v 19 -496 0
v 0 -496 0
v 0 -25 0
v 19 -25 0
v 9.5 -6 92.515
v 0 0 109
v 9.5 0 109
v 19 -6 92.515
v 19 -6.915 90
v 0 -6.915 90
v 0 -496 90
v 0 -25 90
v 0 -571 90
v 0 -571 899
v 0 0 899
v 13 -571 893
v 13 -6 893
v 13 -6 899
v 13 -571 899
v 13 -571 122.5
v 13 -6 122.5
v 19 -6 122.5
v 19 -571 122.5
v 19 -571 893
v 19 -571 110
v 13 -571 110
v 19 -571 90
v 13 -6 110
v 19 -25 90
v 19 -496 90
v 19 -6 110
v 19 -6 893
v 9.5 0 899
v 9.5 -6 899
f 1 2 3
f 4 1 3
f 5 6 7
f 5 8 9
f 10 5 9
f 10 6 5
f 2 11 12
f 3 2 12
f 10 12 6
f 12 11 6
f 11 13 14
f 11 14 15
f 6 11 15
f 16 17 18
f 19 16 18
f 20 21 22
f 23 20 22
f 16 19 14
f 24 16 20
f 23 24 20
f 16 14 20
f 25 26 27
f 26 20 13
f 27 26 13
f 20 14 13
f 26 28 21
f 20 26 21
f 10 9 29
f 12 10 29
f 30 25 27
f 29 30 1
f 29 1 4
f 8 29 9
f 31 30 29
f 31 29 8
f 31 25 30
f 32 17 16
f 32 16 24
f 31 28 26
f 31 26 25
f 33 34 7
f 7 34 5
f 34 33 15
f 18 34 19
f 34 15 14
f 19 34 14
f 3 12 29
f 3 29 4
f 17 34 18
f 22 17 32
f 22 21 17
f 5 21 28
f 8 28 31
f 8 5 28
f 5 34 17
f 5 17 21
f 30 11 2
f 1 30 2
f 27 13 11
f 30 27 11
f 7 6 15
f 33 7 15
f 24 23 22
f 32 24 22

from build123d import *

# Parameters (mm, degrees)
F1_DEPTH = 19
F2_W     = 6
F2_H     = 12.5
F3_DEPTH = 571.001
F4_W     = 9.5
F4_H     = 6
F5_DEPTH = 899.001
F7_DEPTH = 19.001
F8_W     = 6
F8_H     = 6
F9_DEPTH = 571.001


with BuildPart() as f1:
    # F0 (on Right) → F1 (new body)
    with BuildSketch(Plane.YZ):
        Polygon((-496, 0), (0, 0), (0, 899), (-571, 899), (-571, 90), (-496, 90), align=None)
    extrude(amount=F1_DEPTH)

    # F2 (on Front) → F3 (cut, through all)
    with BuildSketch(Plane.XZ):
        with Locations((16, 116.25)):
            Rectangle(F2_W, F2_H)
    extrude(amount=F3_DEPTH, mode=Mode.SUBTRACT)

    # F4 (on Top) → F5 (cut, through all)
    with BuildSketch(Plane.XY):
        with Locations((14.25, -3)):
            Rectangle(F4_W, F4_H)
    extrude(amount=F5_DEPTH, mode=Mode.SUBTRACT)

    # F6 (on Right) → F7 (cut, through all)
    with BuildSketch(Plane.YZ):
        Polygon((-25, 0), (0, 0), (0, 109), (-6.915434, 90), (-25, 90), align=None)
    extrude(amount=F7_DEPTH, mode=Mode.SUBTRACT)

    # F8 (on Front) → F9 (cut, through all)
    with BuildSketch(Plane.XZ):
        with Locations((16, 896)):
            Rectangle(F8_W, F8_H)
    extrude(amount=F9_DEPTH, mode=Mode.SUBTRACT)


solid = f1.part
